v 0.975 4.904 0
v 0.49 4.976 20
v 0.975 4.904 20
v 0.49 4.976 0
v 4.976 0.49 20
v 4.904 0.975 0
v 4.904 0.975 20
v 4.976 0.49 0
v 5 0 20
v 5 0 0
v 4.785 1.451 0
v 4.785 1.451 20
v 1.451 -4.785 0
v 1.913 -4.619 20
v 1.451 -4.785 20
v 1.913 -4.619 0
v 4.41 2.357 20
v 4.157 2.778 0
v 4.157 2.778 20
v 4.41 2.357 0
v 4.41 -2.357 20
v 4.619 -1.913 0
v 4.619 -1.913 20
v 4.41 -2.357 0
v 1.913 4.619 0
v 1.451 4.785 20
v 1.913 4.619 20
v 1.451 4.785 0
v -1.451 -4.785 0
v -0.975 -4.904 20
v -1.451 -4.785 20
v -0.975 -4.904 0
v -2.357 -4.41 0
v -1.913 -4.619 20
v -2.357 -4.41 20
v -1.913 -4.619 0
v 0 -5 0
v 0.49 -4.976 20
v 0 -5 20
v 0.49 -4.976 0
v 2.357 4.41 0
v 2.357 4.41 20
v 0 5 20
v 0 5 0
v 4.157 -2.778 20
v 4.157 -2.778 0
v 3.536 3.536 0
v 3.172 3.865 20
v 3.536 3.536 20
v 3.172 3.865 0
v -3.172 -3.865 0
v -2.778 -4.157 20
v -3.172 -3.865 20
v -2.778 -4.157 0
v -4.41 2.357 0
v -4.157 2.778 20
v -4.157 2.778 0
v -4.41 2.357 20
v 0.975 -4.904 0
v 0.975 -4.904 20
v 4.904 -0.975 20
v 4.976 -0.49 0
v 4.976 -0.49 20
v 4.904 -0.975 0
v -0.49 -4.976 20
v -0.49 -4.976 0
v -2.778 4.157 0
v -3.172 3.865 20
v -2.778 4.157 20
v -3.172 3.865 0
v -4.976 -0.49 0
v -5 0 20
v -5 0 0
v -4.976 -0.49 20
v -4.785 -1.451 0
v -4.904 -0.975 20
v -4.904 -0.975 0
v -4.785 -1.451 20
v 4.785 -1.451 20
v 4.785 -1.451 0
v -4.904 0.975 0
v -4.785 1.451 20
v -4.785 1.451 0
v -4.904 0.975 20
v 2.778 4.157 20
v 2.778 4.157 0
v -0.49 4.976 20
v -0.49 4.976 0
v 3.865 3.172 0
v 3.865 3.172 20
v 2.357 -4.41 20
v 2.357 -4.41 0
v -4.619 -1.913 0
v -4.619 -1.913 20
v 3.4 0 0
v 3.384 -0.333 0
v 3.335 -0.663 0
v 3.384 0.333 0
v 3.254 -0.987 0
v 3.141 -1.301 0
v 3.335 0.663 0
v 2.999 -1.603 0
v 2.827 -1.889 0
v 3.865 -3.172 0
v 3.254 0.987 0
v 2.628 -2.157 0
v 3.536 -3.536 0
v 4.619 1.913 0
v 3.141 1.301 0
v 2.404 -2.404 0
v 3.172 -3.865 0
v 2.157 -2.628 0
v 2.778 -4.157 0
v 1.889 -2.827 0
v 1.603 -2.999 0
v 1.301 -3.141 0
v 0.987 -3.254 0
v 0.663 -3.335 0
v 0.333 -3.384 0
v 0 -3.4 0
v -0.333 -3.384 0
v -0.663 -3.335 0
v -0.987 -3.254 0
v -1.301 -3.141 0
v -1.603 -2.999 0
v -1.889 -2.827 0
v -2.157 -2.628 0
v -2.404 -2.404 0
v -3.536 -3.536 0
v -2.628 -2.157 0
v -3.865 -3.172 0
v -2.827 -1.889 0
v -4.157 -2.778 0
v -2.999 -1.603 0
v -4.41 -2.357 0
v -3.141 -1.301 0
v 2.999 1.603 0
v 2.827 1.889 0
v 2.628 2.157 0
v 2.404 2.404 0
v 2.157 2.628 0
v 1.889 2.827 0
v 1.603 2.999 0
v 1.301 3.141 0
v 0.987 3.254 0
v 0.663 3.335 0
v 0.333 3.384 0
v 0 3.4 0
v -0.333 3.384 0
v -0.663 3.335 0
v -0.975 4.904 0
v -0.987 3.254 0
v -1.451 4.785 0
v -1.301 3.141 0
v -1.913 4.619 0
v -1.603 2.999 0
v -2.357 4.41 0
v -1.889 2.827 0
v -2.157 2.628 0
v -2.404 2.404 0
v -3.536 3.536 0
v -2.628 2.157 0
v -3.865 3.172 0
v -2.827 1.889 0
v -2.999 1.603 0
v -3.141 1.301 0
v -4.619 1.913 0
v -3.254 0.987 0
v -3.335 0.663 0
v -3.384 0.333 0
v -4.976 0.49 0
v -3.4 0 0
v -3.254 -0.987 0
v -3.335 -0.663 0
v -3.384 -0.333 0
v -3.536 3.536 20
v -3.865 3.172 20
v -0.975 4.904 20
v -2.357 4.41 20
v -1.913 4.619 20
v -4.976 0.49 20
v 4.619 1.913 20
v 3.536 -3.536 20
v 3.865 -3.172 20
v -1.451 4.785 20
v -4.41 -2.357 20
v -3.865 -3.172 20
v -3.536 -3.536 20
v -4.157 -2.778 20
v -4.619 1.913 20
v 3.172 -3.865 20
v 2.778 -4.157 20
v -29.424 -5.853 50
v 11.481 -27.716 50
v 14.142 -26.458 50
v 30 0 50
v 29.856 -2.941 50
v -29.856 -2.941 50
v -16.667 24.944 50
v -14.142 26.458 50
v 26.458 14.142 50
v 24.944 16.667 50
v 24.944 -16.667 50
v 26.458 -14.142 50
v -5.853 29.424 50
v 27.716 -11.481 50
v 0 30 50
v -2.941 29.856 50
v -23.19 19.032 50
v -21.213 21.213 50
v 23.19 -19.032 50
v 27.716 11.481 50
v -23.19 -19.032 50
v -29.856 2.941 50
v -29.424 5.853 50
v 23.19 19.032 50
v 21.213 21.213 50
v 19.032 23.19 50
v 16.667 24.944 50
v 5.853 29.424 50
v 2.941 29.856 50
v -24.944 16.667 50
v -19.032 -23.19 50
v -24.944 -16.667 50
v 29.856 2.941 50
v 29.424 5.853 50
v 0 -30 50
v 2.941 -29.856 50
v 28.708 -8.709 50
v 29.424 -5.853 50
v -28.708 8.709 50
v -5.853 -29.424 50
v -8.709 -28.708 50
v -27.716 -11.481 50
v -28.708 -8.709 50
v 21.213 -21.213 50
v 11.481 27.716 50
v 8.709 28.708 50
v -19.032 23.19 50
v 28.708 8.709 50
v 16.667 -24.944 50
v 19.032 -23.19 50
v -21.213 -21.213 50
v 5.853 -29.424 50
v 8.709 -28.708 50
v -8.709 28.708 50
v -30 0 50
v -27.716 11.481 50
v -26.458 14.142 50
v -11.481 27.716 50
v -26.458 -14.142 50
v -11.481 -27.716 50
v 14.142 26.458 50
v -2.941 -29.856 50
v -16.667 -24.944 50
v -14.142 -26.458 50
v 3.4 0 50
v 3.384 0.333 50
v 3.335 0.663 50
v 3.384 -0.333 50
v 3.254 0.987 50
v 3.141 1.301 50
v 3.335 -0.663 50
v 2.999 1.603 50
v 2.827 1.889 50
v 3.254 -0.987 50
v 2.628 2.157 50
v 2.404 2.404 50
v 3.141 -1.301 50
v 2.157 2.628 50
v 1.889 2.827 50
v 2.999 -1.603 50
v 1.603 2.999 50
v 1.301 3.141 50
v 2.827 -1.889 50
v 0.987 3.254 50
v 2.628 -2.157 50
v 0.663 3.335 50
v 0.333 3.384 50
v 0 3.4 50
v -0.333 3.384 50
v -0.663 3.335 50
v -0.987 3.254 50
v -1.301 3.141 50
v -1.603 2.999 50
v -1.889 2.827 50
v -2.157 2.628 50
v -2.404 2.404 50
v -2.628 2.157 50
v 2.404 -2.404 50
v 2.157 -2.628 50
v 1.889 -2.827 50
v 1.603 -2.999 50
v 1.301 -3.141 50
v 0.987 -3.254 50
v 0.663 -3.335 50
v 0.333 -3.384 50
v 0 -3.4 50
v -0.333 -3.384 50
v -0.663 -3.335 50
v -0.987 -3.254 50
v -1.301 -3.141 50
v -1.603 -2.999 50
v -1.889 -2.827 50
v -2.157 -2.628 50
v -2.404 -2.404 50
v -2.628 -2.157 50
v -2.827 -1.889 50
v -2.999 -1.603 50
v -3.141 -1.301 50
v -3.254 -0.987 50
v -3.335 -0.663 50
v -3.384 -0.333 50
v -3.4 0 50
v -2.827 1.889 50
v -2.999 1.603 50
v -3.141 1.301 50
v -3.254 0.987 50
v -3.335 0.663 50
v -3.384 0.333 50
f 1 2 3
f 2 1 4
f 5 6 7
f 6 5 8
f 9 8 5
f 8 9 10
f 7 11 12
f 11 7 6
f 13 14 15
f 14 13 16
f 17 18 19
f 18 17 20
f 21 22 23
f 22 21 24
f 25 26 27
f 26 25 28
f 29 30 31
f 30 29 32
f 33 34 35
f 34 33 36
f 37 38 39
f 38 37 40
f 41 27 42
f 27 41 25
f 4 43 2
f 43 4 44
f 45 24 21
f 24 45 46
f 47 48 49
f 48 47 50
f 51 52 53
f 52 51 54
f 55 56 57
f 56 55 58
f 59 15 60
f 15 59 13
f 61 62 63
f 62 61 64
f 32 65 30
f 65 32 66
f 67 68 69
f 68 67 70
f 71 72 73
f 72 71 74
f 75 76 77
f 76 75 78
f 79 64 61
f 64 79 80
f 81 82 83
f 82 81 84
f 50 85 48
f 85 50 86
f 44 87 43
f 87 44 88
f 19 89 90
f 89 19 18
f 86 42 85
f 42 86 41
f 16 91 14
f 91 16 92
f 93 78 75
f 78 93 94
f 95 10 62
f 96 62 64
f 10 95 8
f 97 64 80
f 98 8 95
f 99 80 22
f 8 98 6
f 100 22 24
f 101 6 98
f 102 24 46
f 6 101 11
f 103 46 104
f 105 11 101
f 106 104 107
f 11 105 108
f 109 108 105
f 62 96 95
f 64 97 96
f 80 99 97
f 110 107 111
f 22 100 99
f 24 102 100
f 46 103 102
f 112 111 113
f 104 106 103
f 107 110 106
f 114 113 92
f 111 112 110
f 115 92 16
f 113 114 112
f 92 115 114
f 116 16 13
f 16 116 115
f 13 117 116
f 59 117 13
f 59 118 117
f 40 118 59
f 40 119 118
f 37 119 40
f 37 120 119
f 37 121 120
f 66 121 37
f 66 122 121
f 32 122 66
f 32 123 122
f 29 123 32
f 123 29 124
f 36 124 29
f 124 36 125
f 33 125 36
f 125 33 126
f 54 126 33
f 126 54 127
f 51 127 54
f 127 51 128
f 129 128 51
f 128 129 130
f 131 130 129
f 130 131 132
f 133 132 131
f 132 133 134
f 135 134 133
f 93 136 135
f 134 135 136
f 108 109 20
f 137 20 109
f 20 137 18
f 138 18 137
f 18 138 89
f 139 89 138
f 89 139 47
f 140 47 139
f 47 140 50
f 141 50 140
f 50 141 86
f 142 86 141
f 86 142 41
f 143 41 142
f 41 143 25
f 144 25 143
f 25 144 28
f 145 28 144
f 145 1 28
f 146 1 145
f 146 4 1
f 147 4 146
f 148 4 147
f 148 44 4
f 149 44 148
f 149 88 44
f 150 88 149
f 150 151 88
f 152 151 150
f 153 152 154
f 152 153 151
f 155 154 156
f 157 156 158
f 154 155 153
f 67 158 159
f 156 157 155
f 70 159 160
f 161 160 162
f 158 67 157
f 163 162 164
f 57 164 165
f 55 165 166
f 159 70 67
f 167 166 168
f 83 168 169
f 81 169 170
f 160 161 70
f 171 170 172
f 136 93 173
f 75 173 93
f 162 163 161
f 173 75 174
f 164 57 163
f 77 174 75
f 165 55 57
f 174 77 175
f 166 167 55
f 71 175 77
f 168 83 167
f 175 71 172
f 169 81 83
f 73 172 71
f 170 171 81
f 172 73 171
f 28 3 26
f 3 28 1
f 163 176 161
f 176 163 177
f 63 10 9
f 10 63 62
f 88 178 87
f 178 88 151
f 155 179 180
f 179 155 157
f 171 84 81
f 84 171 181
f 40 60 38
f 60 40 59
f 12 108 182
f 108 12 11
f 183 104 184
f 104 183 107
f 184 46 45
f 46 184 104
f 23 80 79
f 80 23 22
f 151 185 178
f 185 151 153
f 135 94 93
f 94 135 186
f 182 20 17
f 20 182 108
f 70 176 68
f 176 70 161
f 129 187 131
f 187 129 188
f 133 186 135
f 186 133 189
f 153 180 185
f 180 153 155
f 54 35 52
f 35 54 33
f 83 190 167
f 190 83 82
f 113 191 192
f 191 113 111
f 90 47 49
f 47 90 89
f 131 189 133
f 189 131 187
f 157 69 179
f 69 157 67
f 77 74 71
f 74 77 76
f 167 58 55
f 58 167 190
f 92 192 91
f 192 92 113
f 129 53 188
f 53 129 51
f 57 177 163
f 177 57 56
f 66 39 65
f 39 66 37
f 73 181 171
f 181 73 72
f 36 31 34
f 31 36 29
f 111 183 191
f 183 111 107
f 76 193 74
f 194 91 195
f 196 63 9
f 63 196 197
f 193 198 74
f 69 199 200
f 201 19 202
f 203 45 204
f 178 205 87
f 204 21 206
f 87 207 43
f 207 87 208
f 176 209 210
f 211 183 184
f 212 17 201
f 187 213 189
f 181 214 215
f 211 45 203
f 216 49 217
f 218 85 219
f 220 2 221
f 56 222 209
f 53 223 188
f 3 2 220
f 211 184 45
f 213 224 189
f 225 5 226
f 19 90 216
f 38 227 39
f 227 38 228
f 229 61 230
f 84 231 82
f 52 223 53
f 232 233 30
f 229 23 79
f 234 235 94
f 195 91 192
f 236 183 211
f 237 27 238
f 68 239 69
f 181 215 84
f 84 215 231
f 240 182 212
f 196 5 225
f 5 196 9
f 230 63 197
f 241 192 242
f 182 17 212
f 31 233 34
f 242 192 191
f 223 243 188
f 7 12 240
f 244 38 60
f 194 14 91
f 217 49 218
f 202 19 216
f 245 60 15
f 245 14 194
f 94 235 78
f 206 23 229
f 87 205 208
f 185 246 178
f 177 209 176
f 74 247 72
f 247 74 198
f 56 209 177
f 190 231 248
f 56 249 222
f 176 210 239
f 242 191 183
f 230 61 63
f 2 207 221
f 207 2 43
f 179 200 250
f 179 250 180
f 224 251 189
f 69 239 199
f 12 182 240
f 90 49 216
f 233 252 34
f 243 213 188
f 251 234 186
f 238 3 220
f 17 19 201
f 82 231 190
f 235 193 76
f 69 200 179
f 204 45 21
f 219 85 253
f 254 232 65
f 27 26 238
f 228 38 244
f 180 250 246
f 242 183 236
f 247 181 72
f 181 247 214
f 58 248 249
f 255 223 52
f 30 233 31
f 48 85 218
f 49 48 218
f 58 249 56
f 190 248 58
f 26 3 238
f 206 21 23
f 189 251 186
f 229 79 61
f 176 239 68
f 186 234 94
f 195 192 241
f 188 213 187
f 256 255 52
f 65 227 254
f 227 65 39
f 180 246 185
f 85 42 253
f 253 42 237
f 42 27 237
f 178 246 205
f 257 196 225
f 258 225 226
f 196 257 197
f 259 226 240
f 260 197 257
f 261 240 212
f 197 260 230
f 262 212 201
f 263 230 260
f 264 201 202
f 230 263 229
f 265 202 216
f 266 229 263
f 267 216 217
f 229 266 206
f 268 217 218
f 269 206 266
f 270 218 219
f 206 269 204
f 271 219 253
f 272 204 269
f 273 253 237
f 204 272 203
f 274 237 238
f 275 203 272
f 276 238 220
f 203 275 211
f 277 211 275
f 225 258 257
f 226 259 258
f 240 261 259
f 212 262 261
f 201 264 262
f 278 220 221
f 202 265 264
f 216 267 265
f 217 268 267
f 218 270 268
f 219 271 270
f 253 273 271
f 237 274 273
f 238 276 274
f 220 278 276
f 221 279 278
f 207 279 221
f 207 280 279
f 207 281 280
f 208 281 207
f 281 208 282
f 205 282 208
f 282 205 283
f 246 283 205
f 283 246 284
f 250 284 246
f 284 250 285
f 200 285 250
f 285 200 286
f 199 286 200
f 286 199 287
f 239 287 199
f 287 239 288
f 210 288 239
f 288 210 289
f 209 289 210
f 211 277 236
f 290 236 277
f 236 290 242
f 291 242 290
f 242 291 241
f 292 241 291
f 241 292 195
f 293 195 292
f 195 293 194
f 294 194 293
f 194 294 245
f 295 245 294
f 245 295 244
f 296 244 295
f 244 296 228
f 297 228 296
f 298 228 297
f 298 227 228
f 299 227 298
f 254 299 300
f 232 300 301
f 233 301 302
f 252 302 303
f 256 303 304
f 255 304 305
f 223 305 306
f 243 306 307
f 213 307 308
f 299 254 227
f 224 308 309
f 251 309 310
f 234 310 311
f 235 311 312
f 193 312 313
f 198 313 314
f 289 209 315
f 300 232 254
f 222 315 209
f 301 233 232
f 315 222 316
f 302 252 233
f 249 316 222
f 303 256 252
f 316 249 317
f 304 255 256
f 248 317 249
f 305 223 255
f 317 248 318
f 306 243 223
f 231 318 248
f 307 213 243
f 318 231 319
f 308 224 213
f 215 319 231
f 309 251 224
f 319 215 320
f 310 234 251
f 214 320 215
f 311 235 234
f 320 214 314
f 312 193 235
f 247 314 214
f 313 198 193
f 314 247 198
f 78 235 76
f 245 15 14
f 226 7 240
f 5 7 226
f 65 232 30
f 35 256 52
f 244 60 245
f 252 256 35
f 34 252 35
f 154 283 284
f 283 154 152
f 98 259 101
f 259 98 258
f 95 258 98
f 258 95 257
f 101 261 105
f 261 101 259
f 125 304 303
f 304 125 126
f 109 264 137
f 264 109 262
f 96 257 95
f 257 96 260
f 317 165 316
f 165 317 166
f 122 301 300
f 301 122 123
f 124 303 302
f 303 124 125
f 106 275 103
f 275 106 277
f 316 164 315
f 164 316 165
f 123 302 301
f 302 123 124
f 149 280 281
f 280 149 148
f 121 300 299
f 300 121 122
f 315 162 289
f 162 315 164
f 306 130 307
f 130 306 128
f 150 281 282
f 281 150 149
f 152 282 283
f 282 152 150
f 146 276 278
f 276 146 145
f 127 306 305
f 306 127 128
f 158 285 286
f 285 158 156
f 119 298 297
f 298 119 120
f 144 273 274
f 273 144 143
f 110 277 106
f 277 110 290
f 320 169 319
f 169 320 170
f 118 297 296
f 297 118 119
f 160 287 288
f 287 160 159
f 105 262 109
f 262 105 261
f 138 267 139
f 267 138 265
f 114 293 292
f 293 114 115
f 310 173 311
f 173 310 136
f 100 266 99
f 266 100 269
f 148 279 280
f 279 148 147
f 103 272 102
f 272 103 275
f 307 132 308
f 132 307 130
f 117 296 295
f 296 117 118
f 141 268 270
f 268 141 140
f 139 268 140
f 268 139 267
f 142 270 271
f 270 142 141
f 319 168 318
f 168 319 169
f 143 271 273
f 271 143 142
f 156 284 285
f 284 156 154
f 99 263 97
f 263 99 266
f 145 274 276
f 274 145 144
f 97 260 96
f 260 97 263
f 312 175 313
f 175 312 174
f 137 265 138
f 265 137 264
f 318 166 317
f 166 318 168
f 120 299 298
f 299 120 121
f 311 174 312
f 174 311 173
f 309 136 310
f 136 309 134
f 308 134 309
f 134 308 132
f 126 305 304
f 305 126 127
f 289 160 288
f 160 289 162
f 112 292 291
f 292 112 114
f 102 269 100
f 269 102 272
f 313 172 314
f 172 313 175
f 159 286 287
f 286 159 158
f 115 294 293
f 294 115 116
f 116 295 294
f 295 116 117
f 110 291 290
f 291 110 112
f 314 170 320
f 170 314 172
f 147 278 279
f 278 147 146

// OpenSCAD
// Lab funnel - printed upright with wide opening at top
// Units: mm. Wall thickness 1.6 mm throughout.

$fn = 64;

// --- Dimensions ---
spout_od      = 10;    // spout outer diameter (z = 0 to 20)
spout_h       = 20;    // spout height
cone_od_top   = 60;    // cone outer diameter at rim (z = 50)
cone_od_base  = 10;    // cone outer diameter where it meets spout (z = 20)
cone_h        = 30;    // cone height (z = 20 to 50)
wall          = 1.6;   // wall thickness
eps           = 0.5;   // cutter overshoot past faces

// Derived
bore = spout_od - 2 * wall;   // spout bore = 6.8 mm

difference() {
    union() {
        // Spout tube
        cylinder(d = spout_od, h = spout_h);
        // Cone: r at z = 20 is 5, at z = 50 is 30
        translate([0, 0, spout_h])
            cylinder(h = cone_h, d1 = cone_od_base, d2 = cone_od_top);
    }
    // Through-bore along Z from bottom to top rim
    translate([0, 0, -eps])
        cylinder(h = spout_h + cone_h + 2 * eps, d = bore);
}
